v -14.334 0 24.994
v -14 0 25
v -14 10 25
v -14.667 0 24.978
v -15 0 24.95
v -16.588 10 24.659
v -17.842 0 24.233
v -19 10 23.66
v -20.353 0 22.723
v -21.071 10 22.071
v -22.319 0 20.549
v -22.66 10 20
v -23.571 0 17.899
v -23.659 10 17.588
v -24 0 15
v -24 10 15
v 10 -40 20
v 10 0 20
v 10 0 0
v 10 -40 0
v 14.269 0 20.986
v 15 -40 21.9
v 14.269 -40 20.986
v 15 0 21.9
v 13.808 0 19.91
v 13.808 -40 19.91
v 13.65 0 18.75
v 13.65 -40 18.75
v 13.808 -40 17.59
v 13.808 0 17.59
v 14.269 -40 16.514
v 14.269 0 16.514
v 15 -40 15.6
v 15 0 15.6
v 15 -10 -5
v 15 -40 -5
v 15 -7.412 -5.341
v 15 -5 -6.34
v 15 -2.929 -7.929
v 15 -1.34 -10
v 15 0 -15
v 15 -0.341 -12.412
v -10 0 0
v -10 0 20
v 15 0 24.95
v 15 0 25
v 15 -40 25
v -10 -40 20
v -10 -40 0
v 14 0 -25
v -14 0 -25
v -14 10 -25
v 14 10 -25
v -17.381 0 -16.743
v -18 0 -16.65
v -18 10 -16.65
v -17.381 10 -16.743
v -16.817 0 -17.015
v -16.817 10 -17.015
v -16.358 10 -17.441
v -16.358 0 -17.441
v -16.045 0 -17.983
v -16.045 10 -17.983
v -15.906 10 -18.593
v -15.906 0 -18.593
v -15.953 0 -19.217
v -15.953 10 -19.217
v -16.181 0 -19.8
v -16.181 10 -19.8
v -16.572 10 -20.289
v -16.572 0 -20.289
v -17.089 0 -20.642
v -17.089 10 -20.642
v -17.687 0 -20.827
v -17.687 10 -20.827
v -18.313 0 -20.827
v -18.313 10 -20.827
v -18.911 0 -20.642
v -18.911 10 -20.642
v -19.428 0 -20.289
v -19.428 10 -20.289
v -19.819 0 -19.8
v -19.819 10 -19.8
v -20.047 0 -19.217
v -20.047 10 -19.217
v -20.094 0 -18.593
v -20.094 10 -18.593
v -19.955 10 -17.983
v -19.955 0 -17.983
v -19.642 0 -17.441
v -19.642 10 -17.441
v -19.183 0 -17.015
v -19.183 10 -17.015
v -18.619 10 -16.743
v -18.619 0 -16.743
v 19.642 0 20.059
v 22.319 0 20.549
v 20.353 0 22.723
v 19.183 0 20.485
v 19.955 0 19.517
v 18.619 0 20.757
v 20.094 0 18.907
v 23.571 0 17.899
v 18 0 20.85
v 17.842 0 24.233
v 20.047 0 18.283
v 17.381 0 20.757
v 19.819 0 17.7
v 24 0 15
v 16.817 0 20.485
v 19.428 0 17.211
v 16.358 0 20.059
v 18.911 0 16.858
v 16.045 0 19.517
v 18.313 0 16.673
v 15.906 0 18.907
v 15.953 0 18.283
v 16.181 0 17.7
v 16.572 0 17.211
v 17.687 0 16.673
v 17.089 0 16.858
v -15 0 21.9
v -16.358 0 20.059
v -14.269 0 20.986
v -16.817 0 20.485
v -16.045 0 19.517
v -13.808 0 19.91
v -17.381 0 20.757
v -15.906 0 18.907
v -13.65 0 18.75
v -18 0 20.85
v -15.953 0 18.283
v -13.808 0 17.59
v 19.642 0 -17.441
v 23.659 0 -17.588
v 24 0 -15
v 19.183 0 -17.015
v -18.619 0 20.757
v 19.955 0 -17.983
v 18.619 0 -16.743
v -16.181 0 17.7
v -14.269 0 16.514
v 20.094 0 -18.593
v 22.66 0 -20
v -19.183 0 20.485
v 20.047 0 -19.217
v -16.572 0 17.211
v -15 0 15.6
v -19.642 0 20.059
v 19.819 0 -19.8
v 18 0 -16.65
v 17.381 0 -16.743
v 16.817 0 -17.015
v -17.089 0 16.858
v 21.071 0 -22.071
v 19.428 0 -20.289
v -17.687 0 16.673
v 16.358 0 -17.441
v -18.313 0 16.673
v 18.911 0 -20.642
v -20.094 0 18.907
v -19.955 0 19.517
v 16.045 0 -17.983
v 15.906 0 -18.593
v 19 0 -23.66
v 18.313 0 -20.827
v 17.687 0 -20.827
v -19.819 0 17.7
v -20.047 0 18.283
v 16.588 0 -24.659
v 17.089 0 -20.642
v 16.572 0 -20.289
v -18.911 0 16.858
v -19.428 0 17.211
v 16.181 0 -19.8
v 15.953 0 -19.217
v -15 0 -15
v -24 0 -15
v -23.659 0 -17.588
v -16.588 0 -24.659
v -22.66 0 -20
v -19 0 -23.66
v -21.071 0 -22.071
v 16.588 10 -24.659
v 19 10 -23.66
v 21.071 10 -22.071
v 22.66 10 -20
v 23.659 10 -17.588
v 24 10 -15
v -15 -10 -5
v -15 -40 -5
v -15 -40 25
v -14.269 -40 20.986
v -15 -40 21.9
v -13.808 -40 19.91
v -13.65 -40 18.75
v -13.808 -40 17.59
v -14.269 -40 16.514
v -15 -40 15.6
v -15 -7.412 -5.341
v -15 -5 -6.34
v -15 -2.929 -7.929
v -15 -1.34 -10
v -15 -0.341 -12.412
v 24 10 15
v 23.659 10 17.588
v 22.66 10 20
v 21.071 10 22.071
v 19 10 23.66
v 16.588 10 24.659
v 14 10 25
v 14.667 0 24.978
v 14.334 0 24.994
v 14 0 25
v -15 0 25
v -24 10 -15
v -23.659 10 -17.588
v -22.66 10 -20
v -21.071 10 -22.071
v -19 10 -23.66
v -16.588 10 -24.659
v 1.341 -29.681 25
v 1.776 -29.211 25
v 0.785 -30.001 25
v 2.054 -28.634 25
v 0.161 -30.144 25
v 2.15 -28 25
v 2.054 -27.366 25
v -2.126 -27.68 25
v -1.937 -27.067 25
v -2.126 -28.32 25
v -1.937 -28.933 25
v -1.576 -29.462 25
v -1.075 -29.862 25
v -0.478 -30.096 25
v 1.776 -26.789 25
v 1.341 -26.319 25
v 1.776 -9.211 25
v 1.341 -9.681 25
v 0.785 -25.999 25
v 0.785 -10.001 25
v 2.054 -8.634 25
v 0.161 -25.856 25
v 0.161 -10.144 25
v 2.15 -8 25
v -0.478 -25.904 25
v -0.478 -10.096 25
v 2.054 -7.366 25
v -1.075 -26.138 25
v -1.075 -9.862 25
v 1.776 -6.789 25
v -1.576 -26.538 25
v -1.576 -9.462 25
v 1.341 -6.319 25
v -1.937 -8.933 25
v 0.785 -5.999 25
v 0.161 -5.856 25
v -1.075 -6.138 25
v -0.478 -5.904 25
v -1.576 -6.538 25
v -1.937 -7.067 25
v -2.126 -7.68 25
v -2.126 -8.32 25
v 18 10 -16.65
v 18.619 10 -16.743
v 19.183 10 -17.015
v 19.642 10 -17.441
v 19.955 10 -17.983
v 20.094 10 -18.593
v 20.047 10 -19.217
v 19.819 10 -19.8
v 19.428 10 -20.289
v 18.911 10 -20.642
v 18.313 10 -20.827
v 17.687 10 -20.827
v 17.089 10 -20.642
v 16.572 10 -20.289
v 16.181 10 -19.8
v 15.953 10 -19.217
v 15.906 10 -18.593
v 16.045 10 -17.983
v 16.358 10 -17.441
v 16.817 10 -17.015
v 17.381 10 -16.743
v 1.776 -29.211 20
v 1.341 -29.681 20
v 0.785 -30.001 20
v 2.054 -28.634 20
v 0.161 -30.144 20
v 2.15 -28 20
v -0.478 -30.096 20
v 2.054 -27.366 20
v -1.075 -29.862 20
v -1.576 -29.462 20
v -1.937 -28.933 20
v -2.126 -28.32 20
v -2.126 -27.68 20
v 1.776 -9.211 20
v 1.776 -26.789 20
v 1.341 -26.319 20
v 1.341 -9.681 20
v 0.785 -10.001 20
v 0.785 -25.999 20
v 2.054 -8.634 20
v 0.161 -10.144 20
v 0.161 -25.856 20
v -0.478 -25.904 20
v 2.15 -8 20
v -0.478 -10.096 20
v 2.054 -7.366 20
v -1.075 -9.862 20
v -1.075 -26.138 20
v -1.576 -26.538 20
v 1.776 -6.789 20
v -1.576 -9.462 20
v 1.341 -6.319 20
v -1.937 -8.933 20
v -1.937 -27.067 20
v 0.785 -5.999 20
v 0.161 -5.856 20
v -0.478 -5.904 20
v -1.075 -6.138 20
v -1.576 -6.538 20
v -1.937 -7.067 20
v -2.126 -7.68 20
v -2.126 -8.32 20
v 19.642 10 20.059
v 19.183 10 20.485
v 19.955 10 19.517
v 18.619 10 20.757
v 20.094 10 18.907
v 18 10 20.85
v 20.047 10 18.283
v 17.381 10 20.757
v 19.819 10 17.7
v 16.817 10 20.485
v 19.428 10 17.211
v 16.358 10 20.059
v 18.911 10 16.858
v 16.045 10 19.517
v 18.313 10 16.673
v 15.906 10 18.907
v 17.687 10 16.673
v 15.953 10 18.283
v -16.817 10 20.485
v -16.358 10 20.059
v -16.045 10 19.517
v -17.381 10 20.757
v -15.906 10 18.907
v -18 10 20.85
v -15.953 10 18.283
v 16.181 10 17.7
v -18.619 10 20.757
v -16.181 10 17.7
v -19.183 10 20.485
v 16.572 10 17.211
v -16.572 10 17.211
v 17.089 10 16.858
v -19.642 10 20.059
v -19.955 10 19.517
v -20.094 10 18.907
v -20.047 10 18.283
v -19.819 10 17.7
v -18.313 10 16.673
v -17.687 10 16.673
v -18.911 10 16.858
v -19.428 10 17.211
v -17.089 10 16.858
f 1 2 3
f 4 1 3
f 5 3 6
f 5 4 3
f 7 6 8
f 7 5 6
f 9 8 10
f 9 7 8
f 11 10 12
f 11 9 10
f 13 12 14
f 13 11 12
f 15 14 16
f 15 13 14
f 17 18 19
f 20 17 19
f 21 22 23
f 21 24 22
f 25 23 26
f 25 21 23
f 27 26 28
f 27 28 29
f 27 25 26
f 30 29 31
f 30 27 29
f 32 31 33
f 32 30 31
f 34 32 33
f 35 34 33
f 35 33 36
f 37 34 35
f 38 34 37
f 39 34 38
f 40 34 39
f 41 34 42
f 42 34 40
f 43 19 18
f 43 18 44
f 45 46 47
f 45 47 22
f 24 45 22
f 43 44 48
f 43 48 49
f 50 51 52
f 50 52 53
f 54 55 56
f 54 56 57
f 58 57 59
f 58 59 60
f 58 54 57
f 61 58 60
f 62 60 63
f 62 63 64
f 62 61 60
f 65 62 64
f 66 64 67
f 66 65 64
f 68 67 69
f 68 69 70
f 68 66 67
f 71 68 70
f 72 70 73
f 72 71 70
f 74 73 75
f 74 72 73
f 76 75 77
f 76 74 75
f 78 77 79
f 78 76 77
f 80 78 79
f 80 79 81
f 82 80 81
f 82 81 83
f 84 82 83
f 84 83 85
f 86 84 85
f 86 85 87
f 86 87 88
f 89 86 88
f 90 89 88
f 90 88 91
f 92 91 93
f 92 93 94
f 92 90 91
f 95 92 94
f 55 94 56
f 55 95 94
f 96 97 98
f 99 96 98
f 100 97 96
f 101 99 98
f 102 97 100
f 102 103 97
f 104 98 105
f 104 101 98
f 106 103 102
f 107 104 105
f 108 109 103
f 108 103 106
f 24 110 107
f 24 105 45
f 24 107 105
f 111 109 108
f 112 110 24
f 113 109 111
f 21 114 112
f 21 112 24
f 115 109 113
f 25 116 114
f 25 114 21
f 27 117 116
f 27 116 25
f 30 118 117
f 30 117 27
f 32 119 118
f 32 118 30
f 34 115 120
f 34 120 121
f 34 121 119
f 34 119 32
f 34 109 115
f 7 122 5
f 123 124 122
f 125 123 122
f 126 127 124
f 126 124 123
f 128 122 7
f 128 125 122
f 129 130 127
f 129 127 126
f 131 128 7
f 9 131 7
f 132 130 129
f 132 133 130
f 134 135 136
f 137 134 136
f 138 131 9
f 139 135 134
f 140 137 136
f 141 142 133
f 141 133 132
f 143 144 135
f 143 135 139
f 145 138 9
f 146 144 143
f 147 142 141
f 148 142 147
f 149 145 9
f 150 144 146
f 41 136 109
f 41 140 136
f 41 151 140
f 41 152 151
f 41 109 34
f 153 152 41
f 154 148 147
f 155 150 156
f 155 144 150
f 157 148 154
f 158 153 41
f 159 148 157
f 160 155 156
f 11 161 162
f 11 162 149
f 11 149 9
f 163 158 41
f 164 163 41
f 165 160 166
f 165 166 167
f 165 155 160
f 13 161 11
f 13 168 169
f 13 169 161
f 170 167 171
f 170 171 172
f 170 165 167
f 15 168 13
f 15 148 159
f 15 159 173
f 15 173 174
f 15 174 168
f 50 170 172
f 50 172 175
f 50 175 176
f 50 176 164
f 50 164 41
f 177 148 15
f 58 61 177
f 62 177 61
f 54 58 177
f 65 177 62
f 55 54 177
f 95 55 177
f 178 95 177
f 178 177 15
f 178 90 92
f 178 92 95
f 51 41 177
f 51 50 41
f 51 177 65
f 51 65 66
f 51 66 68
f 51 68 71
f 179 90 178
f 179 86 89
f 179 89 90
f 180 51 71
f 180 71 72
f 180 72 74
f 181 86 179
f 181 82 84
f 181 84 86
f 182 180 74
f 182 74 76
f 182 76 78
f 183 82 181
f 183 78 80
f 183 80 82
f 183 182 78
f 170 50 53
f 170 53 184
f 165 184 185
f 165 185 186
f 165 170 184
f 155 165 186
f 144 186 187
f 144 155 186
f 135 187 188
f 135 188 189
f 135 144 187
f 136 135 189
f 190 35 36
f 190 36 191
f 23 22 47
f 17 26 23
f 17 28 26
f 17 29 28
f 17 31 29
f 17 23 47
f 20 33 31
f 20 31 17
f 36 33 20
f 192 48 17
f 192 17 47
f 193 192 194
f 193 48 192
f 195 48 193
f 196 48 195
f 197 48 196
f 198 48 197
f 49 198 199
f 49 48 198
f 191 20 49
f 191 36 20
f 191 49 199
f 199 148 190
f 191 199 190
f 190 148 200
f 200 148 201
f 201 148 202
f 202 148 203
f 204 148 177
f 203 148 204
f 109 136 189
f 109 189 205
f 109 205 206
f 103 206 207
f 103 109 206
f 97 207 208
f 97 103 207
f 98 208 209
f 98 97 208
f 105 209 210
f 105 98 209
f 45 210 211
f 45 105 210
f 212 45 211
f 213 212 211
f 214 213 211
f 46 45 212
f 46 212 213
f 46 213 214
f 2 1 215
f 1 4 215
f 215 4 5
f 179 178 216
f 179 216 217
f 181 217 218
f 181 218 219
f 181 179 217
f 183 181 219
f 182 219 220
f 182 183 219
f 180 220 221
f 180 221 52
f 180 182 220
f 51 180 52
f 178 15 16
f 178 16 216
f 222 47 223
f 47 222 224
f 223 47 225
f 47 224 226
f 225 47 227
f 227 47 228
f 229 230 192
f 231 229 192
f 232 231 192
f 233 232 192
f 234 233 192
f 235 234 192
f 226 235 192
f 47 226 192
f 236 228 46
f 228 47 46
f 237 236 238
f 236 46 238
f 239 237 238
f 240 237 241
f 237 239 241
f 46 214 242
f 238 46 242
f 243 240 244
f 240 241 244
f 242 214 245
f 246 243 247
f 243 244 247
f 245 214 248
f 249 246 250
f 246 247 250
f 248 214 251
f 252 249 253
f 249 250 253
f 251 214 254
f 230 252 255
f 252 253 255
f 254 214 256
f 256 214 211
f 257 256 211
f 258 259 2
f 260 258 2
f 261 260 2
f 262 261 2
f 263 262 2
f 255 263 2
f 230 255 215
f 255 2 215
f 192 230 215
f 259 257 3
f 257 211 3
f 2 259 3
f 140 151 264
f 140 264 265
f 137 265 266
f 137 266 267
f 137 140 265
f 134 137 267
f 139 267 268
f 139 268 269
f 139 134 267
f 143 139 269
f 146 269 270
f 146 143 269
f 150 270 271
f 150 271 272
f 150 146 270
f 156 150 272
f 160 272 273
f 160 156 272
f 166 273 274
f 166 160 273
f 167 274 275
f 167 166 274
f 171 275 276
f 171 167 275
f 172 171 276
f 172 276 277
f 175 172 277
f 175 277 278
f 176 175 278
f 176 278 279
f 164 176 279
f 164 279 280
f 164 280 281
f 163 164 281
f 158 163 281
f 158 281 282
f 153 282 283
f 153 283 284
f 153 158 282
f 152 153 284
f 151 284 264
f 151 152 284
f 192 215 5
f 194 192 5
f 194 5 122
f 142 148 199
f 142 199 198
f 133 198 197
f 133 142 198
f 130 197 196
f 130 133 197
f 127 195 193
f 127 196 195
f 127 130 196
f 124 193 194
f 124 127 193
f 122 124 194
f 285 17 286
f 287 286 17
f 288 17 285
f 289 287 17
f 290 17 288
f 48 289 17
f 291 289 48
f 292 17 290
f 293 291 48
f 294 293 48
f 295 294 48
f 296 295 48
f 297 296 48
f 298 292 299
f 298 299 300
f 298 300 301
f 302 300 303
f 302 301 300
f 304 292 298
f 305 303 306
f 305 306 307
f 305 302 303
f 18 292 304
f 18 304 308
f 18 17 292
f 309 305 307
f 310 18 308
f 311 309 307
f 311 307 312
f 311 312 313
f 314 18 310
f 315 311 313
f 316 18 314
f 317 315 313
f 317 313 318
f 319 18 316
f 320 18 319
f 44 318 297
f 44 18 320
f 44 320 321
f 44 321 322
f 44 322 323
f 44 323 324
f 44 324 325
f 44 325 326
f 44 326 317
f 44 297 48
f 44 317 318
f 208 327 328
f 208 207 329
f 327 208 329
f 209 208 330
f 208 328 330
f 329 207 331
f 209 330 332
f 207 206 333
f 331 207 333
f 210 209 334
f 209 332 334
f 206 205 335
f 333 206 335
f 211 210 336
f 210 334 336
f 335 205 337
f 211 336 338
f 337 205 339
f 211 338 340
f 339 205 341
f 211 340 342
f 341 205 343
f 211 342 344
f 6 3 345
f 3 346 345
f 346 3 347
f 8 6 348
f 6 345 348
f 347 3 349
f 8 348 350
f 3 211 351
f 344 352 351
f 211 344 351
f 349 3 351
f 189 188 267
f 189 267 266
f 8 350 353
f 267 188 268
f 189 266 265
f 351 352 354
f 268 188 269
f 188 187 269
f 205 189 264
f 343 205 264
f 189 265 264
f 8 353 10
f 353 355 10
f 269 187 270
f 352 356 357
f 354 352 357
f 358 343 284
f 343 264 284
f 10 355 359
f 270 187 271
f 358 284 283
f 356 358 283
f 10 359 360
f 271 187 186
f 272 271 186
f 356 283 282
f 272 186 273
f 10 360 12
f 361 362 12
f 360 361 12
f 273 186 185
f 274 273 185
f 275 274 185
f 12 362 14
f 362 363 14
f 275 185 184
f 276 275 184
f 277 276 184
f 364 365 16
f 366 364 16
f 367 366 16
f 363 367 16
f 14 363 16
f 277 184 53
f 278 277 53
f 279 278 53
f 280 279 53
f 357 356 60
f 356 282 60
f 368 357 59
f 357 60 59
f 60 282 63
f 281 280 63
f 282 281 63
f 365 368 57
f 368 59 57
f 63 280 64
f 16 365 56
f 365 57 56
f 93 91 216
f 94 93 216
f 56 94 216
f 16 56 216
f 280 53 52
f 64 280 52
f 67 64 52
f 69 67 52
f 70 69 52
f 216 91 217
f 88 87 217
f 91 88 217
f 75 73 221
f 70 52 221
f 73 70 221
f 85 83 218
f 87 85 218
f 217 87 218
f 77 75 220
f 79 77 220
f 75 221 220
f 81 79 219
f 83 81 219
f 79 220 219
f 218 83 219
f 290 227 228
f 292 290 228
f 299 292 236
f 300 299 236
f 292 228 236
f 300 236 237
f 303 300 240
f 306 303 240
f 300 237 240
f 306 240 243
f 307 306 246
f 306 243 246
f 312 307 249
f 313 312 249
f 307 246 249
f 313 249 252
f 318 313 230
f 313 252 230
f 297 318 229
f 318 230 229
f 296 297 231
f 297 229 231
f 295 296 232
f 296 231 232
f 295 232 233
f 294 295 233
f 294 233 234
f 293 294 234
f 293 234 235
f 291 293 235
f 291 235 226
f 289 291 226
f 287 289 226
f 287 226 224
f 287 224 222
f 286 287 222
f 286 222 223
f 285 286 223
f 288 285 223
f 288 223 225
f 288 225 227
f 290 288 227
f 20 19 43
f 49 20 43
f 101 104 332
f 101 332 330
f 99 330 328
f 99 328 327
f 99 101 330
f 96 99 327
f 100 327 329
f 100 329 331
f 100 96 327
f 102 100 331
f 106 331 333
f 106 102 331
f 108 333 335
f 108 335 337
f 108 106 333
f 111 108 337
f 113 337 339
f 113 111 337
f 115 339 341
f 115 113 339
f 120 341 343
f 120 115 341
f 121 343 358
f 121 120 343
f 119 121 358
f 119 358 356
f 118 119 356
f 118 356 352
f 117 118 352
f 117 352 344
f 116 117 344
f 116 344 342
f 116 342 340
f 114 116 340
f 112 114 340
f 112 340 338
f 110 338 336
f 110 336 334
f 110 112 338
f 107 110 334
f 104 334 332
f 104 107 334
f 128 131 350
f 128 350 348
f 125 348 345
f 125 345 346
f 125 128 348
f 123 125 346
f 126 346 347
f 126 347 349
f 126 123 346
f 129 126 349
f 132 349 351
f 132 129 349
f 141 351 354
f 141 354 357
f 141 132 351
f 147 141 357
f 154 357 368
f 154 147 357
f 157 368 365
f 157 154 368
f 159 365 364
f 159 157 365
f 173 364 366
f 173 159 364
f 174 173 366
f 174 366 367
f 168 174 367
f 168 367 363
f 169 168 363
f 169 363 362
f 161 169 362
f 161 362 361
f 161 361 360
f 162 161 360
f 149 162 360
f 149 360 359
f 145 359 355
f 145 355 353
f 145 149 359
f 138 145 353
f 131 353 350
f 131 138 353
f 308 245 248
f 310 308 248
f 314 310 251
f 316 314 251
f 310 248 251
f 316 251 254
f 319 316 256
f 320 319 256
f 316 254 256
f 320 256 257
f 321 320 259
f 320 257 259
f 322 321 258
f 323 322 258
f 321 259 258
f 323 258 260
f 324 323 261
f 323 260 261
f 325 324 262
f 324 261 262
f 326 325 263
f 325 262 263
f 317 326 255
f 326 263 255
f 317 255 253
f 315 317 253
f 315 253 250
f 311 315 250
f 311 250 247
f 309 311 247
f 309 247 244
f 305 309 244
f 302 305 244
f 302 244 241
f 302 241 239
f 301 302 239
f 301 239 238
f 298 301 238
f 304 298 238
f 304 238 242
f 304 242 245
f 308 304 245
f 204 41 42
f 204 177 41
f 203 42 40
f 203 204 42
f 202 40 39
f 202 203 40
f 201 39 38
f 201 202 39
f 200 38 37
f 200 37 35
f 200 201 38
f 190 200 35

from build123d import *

# Parameters (mm, degrees)
SKETCH1_R           = 2.1
BOSS_EXTRUDE1_DEPTH = 10
SKETCH6_W           = 30
SKETCH6_H           = 30
SKETCH6_W_2         = 20
SKETCH6_H_2         = 20
BOSS_EXTRUDE5_DEPTH = 40
SKETCH7_R           = 4.35
CUT_EXTRUDE1_DEPTH  = 53.92447449
CUT_EXTRUDE2_REACH  = 70.381
SKETCH8_R           = 2.15
FILLET2_R           = 10


# Read off the part's stored shape, not the designer's step: moBlkMgr[demtay]
with BuildPart() as part:
    # Sketch1 → Boss-Extrude1 (new body)
    with BuildSketch(Plane(origin=(0, 0, 0), x_dir=(1, 0, 0), z_dir=(0, 1, 0))):
        with BuildLine():
            Line((-14, 25), (14, 25))
            ThreePointArc((14, 25), (21.071067812, 22.071067812), (24, 15))
            Line((24, 15), (24, -15))
            ThreePointArc((24, -15), (21.071067812, -22.071067812), (14, -25))
            Line((14, -25), (-14, -25))
            ThreePointArc((-14, -25), (-21.071067812, -22.071067812), (-24, -15))
            Line((-24, -15), (-24, 15))
            ThreePointArc((-24, 15), (-21.071067812, 22.071067812), (-14, 25))
        make_face()
        with Locations(Location((-18, 18.75, 0), (0, 0, 270))):
            Circle(SKETCH1_R, mode=Mode.SUBTRACT)
        with Locations(Location((18, 18.75, 0), (0, 0, 270))):
            Circle(SKETCH1_R, mode=Mode.SUBTRACT)
        with Locations(Location((18, -18.75, 0), (0, 0, 270))):
            Circle(SKETCH1_R, mode=Mode.SUBTRACT)
        with Locations(Location((-18, -18.75, 0), (0, 0, 270))):
            Circle(SKETCH1_R, mode=Mode.SUBTRACT)
    extrude(amount=BOSS_EXTRUDE1_DEPTH)

    # Sketch6 → Boss-Extrude5 (add)
    with BuildSketch(Plane(origin=(0, 0, 0), x_dir=(-1, 0, 0), z_dir=(0, -1, 0))):
        with Locations((0, -10)):
            Rectangle(SKETCH6_W, SKETCH6_H)
        with Locations((0, -10)):
            Rectangle(SKETCH6_W_2, SKETCH6_H_2, mode=Mode.SUBTRACT)
    extrude(amount=BOSS_EXTRUDE5_DEPTH)

    # Sketch7 → Cut-Extrude1 (cut, through all)
    with BuildSketch(Plane(origin=(0, 0, 0), x_dir=(-1, 0, 0), z_dir=(0, -1, 0))):
        with Locations((-18, -18.75)):
            Circle(SKETCH7_R)
        with Locations((18, -18.75)):
            Circle(SKETCH7_R)
    extrude(amount=CUT_EXTRUDE1_DEPTH, mode=Mode.SUBTRACT)

    # Sketch8 → Cut-Extrude2 (cut, up to next)
    with BuildSketch(Plane.XY.offset(25), mode=Mode.PRIVATE) as cut_extrude2_sk1:
        with Locations((0, -8)):
            Circle(SKETCH8_R)
    cut_extrude2_tool1 = extrude(cut_extrude2_sk1.sketch, amount=-CUT_EXTRUDE2_REACH, mode=Mode.PRIVATE) & part.part
    # Sketch8 → Cut-Extrude2 (cut, up to next)
    with BuildSketch(Plane.XY.offset(25), mode=Mode.PRIVATE) as cut_extrude2_sk2:
        with Locations((0, -28)):
            Circle(SKETCH8_R)
    cut_extrude2_tool2 = extrude(cut_extrude2_sk2.sketch, amount=-CUT_EXTRUDE2_REACH, mode=Mode.PRIVATE) & part.part
    add(cut_extrude2_tool1.solids().sort_by_distance((0, -8, 25))[0], mode=Mode.SUBTRACT)
    add(cut_extrude2_tool2.solids().sort_by_distance((0, -28, 25))[0], mode=Mode.SUBTRACT)

    # Fillet2
    fillet2_edges = [part.edges().sort_by_distance(p)[0] for p in [
        (0, 0, -5),
    ]]
    fillet(fillet2_edges, radius=FILLET2_R)


solid = part.part
